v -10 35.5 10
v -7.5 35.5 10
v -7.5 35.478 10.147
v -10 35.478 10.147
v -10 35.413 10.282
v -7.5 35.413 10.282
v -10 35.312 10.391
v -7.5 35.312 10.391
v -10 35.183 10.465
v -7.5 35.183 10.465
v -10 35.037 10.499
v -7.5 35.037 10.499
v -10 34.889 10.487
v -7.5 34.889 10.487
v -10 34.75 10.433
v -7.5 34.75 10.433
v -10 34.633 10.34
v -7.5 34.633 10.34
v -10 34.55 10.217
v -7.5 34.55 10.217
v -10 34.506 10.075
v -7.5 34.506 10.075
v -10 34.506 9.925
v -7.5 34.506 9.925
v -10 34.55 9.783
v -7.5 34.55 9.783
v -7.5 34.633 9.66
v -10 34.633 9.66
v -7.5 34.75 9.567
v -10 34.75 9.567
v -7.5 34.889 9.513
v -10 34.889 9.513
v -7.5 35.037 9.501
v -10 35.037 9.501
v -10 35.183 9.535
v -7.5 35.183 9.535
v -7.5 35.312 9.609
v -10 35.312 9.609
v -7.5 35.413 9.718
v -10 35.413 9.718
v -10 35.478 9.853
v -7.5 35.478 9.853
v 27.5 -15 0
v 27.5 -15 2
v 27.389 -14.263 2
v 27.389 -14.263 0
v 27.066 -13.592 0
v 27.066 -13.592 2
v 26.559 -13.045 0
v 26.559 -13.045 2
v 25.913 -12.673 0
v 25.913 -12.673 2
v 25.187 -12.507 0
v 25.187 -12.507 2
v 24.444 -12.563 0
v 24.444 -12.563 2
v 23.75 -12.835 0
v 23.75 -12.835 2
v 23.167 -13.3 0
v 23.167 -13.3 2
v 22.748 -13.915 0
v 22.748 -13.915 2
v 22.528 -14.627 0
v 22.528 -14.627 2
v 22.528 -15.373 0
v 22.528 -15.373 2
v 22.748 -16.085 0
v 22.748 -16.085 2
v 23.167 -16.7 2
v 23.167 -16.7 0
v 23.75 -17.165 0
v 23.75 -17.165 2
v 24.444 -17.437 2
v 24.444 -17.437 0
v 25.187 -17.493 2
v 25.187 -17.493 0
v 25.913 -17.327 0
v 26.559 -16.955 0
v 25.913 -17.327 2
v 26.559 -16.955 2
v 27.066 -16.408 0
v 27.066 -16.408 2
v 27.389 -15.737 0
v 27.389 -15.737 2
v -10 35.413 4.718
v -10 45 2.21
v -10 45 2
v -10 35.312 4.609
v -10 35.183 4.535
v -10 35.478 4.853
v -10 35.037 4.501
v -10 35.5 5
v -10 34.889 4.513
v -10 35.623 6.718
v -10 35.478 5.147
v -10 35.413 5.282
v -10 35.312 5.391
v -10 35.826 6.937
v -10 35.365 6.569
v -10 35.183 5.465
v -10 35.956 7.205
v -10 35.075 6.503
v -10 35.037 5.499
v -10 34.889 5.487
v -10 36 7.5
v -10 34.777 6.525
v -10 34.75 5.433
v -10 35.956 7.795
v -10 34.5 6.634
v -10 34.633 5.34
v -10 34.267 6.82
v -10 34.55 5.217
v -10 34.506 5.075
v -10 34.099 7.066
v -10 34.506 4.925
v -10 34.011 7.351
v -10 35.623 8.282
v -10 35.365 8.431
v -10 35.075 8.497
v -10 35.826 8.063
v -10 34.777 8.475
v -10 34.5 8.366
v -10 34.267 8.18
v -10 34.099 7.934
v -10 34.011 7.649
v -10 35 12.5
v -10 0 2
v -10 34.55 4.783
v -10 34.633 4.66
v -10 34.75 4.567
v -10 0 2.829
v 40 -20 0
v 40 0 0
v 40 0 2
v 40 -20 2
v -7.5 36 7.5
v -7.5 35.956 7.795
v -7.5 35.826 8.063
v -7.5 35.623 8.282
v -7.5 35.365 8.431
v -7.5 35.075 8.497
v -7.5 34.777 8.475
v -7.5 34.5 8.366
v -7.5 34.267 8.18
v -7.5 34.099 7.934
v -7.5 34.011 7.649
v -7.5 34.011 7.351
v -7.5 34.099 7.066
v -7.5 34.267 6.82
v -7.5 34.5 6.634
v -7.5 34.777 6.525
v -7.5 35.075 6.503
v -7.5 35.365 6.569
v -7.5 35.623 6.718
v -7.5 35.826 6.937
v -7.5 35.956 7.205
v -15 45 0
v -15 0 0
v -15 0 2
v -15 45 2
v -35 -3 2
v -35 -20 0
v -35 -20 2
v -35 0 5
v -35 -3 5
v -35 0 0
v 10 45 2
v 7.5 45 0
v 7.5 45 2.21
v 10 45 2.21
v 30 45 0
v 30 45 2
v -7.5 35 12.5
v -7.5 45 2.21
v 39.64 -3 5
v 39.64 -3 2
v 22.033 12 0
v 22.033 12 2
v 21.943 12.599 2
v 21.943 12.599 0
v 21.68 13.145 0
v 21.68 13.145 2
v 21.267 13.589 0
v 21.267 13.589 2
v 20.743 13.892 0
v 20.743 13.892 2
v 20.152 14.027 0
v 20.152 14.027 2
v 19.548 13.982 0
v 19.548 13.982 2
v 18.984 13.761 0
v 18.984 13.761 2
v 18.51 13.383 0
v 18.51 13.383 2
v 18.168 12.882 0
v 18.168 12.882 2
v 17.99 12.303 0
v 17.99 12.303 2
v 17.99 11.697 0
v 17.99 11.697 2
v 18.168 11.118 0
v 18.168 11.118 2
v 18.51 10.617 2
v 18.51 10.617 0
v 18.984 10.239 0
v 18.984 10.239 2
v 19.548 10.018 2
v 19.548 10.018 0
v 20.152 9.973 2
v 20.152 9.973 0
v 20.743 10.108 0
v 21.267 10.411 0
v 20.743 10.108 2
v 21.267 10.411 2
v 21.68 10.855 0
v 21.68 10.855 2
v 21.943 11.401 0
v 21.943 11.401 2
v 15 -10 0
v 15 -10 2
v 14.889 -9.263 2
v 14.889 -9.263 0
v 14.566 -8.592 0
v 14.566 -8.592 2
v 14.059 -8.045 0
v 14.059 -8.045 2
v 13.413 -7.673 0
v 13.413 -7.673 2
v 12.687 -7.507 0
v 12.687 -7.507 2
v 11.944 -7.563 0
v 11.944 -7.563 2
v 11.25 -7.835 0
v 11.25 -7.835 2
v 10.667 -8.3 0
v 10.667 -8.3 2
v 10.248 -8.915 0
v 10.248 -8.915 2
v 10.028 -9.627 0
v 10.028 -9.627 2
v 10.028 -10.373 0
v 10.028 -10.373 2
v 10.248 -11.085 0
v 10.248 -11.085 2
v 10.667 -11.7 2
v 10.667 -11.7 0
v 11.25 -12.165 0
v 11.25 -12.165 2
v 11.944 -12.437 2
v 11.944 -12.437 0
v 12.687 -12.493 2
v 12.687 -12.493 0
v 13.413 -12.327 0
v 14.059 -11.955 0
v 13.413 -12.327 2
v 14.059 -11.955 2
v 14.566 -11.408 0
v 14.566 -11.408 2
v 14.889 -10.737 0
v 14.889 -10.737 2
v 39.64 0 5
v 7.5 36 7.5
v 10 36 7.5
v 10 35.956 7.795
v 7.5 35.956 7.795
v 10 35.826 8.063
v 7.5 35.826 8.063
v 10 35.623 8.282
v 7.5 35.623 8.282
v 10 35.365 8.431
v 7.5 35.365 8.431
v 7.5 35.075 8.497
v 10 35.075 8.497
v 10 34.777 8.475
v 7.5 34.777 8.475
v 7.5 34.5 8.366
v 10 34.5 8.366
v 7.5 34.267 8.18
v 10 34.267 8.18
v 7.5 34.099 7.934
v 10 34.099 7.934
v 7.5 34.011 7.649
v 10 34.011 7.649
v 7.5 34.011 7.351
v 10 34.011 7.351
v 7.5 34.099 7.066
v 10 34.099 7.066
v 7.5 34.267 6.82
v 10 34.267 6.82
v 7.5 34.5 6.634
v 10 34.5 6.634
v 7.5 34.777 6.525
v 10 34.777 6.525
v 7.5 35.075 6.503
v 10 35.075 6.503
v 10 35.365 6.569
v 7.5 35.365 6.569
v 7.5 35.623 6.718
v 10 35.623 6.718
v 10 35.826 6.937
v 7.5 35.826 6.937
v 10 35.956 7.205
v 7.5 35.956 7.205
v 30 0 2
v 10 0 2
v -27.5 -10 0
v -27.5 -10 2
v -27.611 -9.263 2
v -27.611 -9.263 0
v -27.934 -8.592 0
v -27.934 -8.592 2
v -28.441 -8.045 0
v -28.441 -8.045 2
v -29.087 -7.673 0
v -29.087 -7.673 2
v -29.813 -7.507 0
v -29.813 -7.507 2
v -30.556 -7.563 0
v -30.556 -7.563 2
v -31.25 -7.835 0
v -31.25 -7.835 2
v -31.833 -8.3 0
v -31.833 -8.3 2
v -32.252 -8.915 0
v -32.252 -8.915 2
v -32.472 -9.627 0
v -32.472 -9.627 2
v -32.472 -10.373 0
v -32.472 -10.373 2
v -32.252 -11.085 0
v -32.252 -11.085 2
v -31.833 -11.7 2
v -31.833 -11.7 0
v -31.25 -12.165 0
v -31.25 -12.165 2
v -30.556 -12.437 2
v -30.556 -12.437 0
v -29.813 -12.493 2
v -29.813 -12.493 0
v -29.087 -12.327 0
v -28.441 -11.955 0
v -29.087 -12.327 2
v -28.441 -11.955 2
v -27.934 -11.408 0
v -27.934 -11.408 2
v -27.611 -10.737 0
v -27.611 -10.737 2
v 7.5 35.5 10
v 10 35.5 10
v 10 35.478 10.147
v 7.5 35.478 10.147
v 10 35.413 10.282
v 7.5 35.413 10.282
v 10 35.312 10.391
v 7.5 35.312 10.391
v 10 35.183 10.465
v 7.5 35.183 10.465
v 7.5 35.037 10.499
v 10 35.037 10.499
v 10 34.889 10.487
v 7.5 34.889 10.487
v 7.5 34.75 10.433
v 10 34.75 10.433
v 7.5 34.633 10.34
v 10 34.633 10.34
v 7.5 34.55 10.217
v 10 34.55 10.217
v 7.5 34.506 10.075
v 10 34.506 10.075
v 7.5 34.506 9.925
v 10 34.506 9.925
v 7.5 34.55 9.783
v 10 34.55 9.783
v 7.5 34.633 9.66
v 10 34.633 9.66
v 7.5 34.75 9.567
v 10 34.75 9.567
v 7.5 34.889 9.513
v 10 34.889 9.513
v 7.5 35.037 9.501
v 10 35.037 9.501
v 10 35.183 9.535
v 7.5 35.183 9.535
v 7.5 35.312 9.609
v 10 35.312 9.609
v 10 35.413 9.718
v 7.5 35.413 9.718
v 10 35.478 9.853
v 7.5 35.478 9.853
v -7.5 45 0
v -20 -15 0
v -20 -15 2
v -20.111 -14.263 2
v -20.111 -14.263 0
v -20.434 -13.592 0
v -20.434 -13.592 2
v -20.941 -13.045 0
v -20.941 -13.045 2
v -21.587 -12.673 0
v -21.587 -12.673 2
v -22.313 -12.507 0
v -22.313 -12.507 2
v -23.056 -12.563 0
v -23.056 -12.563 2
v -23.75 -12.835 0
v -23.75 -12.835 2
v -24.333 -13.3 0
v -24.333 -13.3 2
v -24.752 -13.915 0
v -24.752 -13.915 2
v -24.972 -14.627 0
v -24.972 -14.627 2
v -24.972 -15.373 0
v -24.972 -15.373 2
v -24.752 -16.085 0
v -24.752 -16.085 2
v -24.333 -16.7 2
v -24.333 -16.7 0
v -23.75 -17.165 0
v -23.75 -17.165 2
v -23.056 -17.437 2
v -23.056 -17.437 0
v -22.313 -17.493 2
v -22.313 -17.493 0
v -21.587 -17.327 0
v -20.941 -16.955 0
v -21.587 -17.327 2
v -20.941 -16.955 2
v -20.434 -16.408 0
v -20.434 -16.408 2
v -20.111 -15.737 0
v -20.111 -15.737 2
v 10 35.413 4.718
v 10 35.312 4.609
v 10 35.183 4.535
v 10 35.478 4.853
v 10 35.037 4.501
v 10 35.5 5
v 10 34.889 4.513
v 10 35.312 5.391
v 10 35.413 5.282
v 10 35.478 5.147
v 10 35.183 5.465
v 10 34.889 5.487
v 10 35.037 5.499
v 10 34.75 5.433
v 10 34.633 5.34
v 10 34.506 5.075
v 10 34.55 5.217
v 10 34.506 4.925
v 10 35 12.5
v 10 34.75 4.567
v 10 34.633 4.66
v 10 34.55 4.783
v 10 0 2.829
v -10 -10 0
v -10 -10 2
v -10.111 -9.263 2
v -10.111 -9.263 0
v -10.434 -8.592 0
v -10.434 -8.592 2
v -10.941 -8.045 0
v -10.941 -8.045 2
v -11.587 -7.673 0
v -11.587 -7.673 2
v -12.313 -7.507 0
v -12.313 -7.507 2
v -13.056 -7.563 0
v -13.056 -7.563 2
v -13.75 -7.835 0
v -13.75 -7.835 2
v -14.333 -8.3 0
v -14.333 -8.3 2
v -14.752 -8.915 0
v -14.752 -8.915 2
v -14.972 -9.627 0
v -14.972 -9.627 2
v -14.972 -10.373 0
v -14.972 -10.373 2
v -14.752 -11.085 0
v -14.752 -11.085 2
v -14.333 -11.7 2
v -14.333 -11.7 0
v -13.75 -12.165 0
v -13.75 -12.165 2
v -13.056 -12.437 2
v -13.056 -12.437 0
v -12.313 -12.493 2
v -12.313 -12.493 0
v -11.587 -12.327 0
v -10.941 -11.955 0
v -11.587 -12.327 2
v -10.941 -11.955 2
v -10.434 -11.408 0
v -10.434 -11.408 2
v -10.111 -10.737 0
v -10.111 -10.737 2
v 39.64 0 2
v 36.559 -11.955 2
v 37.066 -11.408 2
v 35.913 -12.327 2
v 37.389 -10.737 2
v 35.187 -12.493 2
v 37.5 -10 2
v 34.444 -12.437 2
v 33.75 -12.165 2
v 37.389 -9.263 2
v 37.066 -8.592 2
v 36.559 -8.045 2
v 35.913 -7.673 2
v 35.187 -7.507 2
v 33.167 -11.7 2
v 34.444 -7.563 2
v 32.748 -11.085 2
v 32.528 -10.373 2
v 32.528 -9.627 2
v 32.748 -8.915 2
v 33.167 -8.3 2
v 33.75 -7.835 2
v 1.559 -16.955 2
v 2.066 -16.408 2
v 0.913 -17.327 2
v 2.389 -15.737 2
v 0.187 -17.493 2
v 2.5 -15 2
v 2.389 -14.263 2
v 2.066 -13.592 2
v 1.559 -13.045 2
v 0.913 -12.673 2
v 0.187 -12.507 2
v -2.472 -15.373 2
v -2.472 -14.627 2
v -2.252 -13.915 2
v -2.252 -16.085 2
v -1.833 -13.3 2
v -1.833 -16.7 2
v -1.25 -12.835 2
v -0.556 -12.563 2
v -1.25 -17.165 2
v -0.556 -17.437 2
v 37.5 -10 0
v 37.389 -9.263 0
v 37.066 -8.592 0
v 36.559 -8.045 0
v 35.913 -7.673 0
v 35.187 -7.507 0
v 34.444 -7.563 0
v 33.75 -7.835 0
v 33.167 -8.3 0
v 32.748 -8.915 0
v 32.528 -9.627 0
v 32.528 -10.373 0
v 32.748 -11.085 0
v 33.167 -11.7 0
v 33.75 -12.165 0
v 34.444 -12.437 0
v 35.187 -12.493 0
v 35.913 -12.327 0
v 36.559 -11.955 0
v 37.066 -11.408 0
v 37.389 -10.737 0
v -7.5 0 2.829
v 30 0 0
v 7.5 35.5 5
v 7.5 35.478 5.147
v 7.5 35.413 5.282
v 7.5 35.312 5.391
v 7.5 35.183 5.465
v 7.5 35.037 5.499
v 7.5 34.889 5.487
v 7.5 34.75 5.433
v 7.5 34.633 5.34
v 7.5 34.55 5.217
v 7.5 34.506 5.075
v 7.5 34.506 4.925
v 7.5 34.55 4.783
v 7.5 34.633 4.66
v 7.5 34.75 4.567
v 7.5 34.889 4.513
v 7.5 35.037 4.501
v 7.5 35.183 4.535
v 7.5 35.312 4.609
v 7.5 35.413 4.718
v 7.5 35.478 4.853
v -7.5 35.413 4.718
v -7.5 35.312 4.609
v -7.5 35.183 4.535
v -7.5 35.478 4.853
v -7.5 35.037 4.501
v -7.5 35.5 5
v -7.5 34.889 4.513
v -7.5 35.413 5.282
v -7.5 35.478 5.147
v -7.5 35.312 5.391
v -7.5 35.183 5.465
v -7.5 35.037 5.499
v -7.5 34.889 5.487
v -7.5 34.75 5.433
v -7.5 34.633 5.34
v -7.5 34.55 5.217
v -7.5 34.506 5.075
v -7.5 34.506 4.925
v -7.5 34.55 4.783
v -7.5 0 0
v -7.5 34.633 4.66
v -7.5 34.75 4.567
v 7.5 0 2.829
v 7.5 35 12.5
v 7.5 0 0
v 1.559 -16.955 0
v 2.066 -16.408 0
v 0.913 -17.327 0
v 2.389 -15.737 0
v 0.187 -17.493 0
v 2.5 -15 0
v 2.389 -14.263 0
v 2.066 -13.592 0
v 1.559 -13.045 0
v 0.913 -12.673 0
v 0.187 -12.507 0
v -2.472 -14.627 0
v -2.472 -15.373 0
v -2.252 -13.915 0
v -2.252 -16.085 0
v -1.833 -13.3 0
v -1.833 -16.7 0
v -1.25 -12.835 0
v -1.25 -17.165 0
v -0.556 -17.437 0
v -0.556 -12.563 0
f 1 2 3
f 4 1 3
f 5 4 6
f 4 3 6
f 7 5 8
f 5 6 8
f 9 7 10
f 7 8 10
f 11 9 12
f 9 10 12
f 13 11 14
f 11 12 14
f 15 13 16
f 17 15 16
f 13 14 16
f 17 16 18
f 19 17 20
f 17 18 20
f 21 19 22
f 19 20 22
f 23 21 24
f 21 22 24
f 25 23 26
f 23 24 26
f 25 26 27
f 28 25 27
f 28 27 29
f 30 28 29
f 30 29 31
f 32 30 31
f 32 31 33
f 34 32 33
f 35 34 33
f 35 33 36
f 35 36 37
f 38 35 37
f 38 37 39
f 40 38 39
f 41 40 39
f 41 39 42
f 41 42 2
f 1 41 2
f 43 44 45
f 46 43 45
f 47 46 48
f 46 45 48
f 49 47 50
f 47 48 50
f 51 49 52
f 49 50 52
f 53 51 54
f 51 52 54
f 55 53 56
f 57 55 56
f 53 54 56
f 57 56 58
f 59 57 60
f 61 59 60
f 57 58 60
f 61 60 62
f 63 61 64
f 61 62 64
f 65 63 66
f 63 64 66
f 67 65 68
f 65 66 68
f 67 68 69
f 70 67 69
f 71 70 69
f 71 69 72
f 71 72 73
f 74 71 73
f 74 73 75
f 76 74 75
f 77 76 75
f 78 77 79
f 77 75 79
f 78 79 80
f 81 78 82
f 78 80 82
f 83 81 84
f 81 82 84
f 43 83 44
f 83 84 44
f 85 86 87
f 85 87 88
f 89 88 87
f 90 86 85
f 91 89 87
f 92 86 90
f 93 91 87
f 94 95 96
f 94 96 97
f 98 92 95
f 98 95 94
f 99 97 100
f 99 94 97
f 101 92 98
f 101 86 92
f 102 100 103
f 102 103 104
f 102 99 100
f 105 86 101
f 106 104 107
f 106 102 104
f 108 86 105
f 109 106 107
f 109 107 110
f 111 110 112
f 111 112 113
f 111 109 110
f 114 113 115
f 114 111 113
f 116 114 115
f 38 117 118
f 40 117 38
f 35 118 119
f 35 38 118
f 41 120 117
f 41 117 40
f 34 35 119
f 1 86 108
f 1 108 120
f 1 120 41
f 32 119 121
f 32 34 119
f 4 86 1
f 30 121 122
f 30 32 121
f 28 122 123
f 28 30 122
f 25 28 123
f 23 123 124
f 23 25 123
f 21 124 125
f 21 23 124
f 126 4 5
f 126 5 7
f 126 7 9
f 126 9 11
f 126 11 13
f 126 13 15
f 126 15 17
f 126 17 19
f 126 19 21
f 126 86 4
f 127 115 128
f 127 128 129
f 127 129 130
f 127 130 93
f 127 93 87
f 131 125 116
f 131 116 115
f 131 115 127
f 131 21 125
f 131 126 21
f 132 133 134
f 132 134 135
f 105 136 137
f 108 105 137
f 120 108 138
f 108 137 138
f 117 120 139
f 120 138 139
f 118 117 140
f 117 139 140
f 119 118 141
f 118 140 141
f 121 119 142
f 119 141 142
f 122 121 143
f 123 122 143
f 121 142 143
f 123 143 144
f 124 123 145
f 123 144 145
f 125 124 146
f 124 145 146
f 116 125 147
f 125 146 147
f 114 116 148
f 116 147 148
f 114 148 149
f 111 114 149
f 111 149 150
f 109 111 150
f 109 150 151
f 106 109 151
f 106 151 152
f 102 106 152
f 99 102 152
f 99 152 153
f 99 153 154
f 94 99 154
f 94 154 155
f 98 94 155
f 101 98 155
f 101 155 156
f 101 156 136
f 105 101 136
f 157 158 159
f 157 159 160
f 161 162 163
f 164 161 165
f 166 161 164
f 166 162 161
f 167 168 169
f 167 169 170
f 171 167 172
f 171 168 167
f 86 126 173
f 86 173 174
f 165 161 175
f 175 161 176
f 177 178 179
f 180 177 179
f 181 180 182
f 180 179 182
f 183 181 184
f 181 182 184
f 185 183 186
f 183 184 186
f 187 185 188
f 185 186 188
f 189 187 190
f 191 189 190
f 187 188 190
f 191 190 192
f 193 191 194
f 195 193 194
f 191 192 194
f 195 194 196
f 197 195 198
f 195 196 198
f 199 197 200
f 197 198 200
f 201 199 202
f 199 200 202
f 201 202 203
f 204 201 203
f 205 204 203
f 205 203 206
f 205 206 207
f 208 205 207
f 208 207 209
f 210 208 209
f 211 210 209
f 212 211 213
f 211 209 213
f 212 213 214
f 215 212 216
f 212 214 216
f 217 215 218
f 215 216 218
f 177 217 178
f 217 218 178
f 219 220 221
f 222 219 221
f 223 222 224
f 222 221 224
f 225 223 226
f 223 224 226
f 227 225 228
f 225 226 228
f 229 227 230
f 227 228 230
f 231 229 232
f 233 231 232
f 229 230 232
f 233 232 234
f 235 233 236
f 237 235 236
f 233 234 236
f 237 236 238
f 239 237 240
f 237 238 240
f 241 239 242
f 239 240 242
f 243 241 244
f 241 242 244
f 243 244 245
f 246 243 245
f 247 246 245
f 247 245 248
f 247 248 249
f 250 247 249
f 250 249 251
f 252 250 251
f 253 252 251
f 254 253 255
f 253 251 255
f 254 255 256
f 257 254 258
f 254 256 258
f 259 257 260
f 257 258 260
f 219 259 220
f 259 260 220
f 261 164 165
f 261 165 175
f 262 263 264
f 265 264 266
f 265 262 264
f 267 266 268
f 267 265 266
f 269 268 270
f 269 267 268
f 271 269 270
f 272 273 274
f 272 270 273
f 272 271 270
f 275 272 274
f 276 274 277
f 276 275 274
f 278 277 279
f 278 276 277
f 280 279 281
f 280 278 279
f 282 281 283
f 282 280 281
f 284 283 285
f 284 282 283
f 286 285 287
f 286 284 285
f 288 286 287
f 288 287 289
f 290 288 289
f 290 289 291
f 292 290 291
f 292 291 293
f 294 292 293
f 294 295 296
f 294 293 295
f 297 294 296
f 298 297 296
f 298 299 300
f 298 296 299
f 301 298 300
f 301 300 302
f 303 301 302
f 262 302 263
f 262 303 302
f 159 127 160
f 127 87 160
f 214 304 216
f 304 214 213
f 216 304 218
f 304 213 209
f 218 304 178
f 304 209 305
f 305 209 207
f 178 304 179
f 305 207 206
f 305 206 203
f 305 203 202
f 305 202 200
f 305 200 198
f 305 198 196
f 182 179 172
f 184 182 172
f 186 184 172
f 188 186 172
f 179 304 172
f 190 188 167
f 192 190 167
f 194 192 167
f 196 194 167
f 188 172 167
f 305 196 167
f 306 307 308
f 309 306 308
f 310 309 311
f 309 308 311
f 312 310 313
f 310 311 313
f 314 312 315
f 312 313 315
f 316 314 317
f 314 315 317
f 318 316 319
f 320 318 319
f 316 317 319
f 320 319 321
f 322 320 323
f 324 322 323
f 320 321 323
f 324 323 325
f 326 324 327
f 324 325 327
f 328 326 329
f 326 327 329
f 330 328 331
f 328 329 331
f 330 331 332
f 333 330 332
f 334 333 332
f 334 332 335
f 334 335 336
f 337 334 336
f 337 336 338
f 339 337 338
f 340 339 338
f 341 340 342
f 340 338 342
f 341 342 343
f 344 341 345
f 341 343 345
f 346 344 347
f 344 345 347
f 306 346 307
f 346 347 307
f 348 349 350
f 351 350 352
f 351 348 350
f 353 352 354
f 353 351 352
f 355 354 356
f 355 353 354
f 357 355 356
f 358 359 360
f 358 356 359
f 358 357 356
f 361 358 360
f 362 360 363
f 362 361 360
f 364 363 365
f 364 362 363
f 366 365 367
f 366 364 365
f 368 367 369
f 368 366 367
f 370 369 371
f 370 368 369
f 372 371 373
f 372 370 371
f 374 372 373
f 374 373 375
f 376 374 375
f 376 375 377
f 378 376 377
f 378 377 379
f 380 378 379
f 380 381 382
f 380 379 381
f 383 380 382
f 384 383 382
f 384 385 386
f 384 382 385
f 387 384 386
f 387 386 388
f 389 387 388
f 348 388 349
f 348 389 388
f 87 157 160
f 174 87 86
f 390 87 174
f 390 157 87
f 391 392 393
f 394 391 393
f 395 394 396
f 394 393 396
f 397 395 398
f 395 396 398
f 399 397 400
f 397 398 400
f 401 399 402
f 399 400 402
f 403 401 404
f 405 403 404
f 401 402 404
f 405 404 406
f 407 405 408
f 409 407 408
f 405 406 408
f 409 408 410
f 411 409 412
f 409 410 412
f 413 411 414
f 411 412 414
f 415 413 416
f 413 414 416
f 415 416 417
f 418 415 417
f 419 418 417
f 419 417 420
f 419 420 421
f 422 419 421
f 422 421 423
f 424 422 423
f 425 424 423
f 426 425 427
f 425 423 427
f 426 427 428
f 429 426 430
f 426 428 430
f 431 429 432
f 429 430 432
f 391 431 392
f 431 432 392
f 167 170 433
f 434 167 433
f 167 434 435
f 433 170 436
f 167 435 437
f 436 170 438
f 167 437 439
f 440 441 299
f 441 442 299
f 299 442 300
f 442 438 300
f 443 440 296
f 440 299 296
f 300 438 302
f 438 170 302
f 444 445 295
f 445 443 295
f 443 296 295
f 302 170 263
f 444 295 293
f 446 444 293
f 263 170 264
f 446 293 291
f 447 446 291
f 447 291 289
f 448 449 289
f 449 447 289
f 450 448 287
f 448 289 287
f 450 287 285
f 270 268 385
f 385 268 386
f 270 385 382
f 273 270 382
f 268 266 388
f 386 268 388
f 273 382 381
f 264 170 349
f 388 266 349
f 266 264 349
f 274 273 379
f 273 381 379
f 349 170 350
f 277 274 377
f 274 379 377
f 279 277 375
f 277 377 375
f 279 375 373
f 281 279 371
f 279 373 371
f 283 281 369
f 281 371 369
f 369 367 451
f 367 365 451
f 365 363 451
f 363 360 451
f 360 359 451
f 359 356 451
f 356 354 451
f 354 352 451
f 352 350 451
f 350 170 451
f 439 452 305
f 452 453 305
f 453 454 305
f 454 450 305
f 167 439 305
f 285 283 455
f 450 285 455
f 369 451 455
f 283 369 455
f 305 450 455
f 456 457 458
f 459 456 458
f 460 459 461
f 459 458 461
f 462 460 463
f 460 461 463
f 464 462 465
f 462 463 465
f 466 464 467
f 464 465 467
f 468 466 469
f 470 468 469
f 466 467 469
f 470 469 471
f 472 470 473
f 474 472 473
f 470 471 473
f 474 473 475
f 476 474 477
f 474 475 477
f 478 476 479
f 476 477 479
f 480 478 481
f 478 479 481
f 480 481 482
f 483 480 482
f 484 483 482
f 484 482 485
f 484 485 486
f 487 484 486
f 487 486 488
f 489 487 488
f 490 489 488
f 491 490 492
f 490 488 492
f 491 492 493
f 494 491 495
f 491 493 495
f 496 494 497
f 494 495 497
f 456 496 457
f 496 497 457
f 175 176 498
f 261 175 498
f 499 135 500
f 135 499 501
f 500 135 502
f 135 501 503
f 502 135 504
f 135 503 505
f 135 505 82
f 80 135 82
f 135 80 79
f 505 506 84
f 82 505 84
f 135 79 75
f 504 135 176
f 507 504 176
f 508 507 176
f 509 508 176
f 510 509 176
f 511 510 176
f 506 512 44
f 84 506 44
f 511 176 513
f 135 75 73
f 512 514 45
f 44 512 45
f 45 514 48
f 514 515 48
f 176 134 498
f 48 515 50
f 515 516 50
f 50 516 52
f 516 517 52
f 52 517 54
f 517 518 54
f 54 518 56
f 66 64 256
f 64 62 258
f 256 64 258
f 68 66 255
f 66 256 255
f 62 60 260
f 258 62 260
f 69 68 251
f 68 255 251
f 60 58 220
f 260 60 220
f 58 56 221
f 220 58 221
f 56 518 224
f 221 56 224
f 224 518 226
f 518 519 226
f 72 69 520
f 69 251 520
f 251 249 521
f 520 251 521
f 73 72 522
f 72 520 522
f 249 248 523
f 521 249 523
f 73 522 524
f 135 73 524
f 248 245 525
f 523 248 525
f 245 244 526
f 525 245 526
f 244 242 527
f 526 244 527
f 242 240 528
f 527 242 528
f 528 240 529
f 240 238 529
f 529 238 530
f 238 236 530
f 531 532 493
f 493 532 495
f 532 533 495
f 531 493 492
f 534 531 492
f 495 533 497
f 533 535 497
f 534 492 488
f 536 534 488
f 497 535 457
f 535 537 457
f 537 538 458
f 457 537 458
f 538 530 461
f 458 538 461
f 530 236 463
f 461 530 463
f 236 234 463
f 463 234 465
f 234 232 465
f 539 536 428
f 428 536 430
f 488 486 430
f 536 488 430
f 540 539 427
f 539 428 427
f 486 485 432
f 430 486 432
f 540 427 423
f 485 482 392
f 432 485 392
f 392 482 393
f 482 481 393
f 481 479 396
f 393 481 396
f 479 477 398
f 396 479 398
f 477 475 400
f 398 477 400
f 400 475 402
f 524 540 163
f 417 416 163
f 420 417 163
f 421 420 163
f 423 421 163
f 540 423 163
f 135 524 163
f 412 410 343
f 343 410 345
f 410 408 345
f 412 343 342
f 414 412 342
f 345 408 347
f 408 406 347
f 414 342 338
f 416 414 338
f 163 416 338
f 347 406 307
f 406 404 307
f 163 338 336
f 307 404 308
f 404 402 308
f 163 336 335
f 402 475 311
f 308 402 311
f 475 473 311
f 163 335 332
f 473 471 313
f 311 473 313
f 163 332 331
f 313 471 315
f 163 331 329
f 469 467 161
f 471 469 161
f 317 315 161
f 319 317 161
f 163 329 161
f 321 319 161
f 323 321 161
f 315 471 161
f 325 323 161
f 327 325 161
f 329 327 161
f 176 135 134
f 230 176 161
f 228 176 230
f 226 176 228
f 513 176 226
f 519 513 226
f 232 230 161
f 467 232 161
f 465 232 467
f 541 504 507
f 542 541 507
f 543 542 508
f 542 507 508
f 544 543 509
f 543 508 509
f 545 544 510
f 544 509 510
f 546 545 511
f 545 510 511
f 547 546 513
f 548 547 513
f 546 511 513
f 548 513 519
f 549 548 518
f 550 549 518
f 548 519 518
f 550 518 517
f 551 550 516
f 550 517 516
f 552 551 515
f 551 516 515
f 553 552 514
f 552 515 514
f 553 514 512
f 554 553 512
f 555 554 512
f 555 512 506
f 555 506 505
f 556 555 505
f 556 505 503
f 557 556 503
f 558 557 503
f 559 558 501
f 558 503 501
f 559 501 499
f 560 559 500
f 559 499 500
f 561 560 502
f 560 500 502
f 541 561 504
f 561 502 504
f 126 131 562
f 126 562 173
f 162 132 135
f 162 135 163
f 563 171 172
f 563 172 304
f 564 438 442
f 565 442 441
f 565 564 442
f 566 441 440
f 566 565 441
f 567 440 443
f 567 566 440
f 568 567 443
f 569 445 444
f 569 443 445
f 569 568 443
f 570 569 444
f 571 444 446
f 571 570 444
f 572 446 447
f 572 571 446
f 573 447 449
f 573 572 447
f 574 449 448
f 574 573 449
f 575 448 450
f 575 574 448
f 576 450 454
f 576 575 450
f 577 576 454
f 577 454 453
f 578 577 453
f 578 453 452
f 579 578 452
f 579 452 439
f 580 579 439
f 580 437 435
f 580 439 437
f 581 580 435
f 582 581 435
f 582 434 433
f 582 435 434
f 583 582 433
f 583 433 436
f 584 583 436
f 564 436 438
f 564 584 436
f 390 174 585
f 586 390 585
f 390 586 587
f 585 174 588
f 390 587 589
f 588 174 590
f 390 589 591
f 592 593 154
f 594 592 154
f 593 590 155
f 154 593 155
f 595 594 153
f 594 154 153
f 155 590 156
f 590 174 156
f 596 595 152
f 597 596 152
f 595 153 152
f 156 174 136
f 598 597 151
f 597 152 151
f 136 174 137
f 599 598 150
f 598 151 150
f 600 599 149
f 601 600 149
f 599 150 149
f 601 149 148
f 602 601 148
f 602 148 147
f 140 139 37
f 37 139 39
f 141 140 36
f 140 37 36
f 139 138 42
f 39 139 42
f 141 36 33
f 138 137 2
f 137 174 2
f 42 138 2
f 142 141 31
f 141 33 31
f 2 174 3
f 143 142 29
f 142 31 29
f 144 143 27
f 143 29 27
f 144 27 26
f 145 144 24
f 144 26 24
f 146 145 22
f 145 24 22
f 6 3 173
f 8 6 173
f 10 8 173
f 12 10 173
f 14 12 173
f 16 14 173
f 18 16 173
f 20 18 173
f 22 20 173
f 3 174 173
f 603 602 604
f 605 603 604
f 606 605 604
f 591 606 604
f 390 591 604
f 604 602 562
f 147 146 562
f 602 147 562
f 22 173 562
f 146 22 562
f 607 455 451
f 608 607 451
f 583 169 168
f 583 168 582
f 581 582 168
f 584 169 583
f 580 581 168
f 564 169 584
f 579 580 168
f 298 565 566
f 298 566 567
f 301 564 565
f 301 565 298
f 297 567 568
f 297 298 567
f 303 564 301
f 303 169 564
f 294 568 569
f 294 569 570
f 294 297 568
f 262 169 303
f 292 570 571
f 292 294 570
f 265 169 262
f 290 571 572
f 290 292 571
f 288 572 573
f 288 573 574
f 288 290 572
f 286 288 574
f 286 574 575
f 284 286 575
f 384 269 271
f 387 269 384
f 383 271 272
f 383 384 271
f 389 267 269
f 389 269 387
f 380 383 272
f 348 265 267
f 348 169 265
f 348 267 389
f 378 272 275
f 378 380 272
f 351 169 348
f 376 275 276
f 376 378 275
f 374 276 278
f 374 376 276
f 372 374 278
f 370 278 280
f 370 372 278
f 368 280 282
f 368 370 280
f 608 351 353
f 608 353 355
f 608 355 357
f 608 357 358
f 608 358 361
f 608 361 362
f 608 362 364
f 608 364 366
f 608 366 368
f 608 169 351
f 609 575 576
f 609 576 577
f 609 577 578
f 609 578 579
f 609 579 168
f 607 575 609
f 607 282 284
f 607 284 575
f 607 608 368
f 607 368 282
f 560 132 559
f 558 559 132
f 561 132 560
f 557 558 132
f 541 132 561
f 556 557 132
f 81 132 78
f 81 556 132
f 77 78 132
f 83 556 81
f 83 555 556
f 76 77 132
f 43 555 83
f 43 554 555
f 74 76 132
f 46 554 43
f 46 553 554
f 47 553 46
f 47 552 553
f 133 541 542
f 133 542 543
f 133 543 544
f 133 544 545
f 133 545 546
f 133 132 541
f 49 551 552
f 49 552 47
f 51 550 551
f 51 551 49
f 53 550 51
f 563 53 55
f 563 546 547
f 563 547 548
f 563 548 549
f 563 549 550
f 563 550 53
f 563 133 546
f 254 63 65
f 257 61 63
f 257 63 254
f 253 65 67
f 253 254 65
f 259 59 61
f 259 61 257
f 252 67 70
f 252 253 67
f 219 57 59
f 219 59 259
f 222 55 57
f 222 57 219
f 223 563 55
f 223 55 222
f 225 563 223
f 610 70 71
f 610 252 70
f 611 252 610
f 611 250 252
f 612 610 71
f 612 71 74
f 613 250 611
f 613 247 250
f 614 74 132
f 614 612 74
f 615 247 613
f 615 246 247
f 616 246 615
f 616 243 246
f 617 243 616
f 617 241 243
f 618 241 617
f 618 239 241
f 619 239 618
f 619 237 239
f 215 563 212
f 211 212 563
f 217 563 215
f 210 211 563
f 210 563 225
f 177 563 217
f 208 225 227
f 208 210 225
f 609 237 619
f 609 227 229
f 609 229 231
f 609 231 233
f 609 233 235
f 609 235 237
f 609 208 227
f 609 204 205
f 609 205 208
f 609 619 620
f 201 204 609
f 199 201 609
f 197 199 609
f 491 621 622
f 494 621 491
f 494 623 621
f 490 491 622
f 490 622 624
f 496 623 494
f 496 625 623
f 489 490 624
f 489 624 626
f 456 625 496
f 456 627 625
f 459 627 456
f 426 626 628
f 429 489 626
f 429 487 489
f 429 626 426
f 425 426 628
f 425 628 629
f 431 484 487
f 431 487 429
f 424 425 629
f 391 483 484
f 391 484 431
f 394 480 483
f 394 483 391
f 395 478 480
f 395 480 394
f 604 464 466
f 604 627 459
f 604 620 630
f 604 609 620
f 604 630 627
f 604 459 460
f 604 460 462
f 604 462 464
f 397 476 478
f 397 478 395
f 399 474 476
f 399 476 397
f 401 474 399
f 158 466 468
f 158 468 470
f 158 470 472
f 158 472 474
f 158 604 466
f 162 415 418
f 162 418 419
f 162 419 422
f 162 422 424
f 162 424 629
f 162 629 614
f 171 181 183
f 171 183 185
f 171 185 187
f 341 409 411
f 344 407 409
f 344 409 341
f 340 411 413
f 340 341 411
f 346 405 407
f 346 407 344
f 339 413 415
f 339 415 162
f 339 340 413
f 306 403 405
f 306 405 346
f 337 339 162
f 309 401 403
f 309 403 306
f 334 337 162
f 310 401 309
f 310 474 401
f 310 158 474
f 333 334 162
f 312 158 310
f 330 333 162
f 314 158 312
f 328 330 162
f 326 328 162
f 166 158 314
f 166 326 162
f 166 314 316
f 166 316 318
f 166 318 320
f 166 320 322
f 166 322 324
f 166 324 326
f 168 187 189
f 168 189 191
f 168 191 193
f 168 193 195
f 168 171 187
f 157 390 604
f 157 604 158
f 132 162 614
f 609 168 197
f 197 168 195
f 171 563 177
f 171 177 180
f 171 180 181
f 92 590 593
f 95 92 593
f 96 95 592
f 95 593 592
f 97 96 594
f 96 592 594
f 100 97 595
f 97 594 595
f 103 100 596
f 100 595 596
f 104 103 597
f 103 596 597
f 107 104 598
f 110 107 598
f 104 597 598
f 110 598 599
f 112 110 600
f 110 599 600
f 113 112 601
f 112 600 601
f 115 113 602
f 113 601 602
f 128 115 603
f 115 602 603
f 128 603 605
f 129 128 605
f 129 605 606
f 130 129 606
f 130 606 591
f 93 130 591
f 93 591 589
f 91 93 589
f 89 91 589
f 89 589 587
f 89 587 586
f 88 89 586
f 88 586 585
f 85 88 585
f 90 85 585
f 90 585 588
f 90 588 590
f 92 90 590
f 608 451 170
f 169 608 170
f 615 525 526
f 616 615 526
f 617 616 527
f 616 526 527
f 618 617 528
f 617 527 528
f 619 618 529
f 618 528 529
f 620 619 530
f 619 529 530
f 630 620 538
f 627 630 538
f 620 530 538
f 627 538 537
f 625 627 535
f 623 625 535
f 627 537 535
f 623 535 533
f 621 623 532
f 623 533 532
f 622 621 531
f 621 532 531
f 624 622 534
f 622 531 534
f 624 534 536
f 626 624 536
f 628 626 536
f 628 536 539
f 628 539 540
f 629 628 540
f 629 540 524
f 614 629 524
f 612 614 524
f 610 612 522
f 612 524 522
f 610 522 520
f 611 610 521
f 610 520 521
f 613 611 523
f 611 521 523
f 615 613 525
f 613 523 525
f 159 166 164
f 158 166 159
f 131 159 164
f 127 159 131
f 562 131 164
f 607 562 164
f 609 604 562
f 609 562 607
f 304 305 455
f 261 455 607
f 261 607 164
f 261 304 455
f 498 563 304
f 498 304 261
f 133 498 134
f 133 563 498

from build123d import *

# Parameters (mm, degrees)
PAD_DEPTH       = 2
PAD001_DEPTH    = 2.5
SKETCH002_R     = 1
SKETCH002_R_2   = 0.5
POCKET_DEPTH    = 5
SKETCH003_R     = 2.5
POCKET001_DEPTH = 2
SKETCH004_W     = 74.639832
SKETCH004_H     = 3
PAD002_DEPTH    = 3
SKETCH005_R     = 2.032906
POCKET002_DEPTH = 2


with BuildPart() as part:
    # Sketch → Pad (new body)
    with BuildSketch(Plane.XY):
        Polygon((-35, 0), (-15, 0), (-15, 45), (-10, 45), (-10, 0), (10, 0), (10, 45), (30, 45), (30, 0), (40, 0), (40, -20), (-35, -20), align=None)
    extrude(amount=PAD_DEPTH)

    # Sketch001 (on Face4 of Pad) → Pad001 (join)
    with BuildSketch(Plane.YZ.offset(-10)):
        Polygon((-3, 0), (-3, 2), (35, 12.5), (45, 2.20967), (45, 0), align=None)
    pad001 = extrude(amount=PAD001_DEPTH)

    # Sketch002 (on Face16 of Pad001) → Pocket (cut)
    with BuildSketch(Plane.YZ.offset(-7.5)):
        with Locations((35, 7.5)):
            Circle(SKETCH002_R)
        with Locations((35, 10)):
            Circle(SKETCH002_R_2)
        with Locations((35, 5)):
            Circle(SKETCH002_R_2)
    pocket = extrude(amount=-POCKET_DEPTH, mode=Mode.SUBTRACT)

    # Mirrored: Pad001, Pocket across YZ
    add(pad001.mirror(Plane.YZ))
    add(pocket.mirror(Plane.YZ), mode=Mode.SUBTRACT)

    # Sketch003 (on Face5 of Mirrored) → Pocket001 (cut)
    with BuildSketch(Plane.XY.offset(2)):
        with Locations((-30, -10)):
            Circle(SKETCH003_R)
        with Locations((-22.5, -15)):
            Circle(SKETCH003_R)
        with Locations((-12.5, -10)):
            Circle(SKETCH003_R)
        with Locations((35, -10)):
            Circle(SKETCH003_R)
        with Locations((25, -15)):
            Circle(SKETCH003_R)
        with Locations((12.5, -10)):
            Circle(SKETCH003_R)
        with Locations((0, -15)):
            Circle(SKETCH003_R)
    extrude(amount=-POCKET001_DEPTH, mode=Mode.SUBTRACT)

    # Sketch004 (on Face5 of Pocket001) → Pad002 (join)
    with BuildSketch(Plane.XY.offset(2)):
        with Locations((2.319916, -1.5)):
            Rectangle(SKETCH004_W, SKETCH004_H)
    extrude(amount=PAD002_DEPTH)

    # Sketch005 (on Face33 of Pad002) → Pocket002 (cut)
    with BuildSketch(Plane.XY.offset(2)):
        with Locations((20, 12)):
            Circle(SKETCH005_R)
    extrude(amount=-POCKET002_DEPTH, mode=Mode.SUBTRACT)


solid = part.part
